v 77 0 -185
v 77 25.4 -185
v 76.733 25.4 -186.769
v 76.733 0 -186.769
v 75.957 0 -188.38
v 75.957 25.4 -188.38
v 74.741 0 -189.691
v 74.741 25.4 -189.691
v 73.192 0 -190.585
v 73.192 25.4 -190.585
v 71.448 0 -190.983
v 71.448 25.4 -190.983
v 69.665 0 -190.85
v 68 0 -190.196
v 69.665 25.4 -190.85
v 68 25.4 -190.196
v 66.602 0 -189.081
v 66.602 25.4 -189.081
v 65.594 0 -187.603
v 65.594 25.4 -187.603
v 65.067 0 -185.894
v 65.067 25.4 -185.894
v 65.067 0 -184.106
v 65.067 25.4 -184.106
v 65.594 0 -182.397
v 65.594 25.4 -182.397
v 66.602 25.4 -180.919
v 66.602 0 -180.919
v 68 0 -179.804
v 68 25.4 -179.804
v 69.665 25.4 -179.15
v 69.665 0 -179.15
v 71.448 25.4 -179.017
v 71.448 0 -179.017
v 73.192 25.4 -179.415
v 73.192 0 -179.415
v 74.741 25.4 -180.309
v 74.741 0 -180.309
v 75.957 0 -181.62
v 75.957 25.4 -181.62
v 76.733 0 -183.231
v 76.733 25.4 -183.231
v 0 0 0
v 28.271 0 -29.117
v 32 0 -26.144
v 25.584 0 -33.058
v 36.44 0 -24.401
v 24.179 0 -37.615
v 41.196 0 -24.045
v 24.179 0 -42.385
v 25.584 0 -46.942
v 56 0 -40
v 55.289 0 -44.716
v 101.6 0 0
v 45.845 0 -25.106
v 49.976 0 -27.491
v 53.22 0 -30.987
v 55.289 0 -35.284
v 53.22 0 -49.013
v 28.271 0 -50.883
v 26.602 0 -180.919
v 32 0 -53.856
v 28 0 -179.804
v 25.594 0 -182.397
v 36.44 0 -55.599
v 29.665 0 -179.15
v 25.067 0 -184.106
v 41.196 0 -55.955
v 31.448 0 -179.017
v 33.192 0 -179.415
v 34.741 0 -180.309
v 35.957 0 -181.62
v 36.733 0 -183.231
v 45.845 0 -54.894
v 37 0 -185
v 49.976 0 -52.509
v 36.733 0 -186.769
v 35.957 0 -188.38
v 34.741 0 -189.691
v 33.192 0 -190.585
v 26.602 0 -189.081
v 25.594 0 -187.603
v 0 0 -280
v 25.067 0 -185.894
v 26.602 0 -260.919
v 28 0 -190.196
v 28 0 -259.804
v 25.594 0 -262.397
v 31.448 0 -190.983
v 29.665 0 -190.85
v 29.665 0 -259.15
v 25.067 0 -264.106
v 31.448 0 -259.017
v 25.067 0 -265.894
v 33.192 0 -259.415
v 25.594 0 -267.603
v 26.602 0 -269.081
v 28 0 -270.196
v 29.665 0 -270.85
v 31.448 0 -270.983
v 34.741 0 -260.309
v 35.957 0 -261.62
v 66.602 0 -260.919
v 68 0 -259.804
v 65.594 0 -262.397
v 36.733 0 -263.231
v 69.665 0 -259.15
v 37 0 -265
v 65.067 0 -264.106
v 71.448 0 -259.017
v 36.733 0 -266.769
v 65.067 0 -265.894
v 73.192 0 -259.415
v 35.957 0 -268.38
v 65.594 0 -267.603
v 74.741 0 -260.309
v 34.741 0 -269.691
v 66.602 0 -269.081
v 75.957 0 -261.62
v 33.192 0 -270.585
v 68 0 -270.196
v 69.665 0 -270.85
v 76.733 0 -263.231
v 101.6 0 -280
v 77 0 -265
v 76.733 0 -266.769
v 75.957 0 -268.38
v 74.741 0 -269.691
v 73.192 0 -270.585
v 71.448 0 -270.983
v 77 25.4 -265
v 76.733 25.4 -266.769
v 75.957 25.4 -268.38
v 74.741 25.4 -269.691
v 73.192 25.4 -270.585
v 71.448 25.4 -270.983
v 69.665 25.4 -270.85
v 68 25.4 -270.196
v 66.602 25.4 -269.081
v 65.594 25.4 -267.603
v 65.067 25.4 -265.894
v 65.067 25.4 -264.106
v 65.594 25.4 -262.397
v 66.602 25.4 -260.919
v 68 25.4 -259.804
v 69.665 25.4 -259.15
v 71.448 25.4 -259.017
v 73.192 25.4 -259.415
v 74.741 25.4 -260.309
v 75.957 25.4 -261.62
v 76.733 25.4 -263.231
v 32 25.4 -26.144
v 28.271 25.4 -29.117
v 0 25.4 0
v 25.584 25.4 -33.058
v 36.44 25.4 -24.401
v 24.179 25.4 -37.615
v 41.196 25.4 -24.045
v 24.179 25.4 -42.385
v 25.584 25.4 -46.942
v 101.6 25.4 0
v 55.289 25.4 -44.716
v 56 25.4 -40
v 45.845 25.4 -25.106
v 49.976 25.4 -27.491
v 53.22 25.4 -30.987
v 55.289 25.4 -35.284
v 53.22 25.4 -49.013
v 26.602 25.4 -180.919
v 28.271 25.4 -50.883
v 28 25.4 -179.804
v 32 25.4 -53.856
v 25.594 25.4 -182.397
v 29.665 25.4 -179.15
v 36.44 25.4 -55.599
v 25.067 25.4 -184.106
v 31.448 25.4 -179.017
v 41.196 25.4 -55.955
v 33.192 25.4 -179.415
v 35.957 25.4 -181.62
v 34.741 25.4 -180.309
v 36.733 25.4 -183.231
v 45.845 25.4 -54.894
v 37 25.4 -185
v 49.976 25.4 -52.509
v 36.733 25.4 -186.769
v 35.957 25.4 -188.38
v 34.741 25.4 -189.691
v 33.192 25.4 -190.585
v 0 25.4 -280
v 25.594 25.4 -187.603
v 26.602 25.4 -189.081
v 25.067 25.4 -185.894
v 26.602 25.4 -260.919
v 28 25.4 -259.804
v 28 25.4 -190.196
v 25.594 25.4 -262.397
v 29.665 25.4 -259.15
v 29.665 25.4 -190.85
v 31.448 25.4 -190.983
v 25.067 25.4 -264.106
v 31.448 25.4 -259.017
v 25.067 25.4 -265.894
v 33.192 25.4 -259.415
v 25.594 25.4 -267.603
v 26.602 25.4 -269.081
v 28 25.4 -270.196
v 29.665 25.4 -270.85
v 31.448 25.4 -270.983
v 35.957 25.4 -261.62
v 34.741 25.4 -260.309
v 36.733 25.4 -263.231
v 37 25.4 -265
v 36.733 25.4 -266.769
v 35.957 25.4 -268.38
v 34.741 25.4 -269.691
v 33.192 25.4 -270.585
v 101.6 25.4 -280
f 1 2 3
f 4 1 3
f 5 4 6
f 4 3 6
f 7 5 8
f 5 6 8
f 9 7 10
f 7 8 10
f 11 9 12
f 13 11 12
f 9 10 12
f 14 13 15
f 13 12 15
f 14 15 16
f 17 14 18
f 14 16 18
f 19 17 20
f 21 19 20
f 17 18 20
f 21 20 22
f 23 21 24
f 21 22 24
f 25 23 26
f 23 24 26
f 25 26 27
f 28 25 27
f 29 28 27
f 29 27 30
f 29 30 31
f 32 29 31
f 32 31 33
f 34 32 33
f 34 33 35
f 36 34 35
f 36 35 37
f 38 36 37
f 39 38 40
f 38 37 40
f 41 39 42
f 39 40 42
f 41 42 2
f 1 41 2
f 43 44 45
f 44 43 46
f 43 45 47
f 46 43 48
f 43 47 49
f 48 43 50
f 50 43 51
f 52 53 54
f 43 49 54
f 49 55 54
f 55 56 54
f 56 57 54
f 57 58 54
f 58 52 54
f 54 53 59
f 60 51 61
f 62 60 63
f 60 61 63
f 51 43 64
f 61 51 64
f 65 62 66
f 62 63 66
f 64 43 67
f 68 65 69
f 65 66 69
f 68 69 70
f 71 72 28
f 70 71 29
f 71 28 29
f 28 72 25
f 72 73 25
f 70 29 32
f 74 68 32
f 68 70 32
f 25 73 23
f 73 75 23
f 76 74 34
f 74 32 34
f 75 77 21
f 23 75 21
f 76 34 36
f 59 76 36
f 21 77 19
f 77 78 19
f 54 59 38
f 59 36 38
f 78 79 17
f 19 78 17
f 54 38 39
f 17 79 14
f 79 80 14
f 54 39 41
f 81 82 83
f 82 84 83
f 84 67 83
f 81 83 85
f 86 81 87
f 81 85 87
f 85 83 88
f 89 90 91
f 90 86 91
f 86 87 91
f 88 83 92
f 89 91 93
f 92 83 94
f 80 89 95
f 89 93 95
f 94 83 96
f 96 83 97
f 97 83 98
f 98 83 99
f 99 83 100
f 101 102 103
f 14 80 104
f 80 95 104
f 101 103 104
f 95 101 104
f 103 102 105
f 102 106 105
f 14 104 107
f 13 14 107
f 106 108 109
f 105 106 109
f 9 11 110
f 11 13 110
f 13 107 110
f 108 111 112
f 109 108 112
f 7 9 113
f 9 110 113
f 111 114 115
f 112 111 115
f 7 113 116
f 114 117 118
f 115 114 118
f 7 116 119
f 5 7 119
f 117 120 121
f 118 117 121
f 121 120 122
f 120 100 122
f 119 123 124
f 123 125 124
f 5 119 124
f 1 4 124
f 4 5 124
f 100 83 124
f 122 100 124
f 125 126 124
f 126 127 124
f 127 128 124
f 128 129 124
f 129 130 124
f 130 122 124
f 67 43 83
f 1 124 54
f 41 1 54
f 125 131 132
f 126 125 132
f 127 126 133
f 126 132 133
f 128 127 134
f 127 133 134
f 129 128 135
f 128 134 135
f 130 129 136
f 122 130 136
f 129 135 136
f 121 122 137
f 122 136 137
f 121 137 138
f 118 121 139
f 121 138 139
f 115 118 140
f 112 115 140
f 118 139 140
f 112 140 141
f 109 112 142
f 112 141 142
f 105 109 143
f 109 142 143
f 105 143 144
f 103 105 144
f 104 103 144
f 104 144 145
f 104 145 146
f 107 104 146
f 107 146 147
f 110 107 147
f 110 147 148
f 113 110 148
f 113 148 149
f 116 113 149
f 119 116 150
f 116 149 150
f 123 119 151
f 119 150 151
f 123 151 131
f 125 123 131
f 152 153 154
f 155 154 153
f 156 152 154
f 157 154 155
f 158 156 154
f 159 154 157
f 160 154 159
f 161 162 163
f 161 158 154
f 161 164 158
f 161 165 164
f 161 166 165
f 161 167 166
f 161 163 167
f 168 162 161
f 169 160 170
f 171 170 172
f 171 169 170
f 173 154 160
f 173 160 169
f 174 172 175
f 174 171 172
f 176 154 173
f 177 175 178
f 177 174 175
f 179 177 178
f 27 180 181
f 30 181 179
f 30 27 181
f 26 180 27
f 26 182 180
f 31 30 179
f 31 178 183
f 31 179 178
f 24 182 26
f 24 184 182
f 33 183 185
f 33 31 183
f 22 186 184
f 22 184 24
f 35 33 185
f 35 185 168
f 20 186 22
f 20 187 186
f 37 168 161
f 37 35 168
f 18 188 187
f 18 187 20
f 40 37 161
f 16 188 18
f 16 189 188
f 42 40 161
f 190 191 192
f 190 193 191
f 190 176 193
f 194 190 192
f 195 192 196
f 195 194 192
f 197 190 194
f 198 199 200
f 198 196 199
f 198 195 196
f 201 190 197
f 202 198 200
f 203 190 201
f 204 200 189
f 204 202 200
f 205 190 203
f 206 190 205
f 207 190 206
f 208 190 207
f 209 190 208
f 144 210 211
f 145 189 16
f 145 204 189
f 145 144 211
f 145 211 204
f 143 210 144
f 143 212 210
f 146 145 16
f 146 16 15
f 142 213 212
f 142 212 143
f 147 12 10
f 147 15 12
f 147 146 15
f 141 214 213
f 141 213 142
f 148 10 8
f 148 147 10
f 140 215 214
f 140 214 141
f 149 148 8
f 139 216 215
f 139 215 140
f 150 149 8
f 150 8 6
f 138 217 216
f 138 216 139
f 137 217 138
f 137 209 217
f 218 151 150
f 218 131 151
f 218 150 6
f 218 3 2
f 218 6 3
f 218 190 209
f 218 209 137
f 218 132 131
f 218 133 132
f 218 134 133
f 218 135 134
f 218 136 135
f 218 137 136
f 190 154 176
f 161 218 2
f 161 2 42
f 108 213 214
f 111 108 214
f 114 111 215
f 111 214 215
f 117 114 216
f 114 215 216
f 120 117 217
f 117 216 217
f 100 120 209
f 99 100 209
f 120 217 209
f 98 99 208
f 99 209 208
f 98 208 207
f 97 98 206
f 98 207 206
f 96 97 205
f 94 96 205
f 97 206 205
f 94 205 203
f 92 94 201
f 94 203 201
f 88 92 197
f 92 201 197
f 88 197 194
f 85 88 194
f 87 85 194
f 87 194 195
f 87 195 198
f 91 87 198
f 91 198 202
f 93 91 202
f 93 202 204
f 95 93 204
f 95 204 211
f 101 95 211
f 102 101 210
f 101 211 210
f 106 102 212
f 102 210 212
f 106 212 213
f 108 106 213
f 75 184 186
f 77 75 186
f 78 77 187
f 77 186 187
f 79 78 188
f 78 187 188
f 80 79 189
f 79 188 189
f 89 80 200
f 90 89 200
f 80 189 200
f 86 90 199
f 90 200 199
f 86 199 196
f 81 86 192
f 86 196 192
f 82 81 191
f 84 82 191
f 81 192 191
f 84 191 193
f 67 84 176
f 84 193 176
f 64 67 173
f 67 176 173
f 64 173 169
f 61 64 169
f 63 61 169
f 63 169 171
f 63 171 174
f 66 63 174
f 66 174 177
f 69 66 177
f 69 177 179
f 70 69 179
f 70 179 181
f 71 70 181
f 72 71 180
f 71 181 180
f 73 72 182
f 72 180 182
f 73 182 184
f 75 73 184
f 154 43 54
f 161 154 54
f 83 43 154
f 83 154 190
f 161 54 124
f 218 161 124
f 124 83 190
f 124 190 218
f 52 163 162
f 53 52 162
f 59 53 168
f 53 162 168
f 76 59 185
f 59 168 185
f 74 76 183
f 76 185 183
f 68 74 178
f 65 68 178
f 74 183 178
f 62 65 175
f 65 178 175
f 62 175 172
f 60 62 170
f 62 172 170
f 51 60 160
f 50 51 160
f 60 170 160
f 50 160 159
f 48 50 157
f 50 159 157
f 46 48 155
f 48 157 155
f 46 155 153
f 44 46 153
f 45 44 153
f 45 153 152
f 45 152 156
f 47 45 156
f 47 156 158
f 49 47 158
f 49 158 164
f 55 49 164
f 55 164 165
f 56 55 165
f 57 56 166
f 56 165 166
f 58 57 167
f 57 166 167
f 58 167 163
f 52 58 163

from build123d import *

# Parameters (mm, degrees)
SKETCH2_W           = 101.6
SKETCH2_H           = 280
BOSS_EXTRUDE1_DEPTH = 25.4
SKETCH3_R           = 6
CUT_EXTRUDE1_DEPTH  = 25.4
SKETCH4_R           = 16
CUT_EXTRUDE2_DEPTH  = 25.4


with BuildPart() as part:
    # Sketch2 → Boss-Extrude1 (new body)
    with BuildSketch(Plane(origin=(0, 0, 0), x_dir=(1, 0, 0), z_dir=(0, 1, 0))):
        with Locations((50.8, 140)):
            Rectangle(SKETCH2_W, SKETCH2_H)
    extrude(amount=BOSS_EXTRUDE1_DEPTH)

    # Sketch3 → Cut-Extrude1 (cut)
    with BuildSketch(Plane(origin=(0, 25.4, 0), x_dir=(1, 0, 0), z_dir=(0, 1, 0))):
        with Locations((71, 265)):
            Circle(SKETCH3_R)
        with Locations((31, 265)):
            Circle(SKETCH3_R)
        with Locations((31, 185)):
            Circle(SKETCH3_R)
        with Locations((71, 185)):
            Circle(SKETCH3_R)
    extrude(amount=-CUT_EXTRUDE1_DEPTH, mode=Mode.SUBTRACT)

    # Sketch4 → Cut-Extrude2 (cut)
    with BuildSketch(Plane(origin=(0, 25.4, 0), x_dir=(1, 0, 0), z_dir=(0, 1, 0))):
        with Locations((40, 40)):
            Circle(SKETCH4_R)
    extrude(amount=-CUT_EXTRUDE2_DEPTH, mode=Mode.SUBTRACT)


solid = part.part
